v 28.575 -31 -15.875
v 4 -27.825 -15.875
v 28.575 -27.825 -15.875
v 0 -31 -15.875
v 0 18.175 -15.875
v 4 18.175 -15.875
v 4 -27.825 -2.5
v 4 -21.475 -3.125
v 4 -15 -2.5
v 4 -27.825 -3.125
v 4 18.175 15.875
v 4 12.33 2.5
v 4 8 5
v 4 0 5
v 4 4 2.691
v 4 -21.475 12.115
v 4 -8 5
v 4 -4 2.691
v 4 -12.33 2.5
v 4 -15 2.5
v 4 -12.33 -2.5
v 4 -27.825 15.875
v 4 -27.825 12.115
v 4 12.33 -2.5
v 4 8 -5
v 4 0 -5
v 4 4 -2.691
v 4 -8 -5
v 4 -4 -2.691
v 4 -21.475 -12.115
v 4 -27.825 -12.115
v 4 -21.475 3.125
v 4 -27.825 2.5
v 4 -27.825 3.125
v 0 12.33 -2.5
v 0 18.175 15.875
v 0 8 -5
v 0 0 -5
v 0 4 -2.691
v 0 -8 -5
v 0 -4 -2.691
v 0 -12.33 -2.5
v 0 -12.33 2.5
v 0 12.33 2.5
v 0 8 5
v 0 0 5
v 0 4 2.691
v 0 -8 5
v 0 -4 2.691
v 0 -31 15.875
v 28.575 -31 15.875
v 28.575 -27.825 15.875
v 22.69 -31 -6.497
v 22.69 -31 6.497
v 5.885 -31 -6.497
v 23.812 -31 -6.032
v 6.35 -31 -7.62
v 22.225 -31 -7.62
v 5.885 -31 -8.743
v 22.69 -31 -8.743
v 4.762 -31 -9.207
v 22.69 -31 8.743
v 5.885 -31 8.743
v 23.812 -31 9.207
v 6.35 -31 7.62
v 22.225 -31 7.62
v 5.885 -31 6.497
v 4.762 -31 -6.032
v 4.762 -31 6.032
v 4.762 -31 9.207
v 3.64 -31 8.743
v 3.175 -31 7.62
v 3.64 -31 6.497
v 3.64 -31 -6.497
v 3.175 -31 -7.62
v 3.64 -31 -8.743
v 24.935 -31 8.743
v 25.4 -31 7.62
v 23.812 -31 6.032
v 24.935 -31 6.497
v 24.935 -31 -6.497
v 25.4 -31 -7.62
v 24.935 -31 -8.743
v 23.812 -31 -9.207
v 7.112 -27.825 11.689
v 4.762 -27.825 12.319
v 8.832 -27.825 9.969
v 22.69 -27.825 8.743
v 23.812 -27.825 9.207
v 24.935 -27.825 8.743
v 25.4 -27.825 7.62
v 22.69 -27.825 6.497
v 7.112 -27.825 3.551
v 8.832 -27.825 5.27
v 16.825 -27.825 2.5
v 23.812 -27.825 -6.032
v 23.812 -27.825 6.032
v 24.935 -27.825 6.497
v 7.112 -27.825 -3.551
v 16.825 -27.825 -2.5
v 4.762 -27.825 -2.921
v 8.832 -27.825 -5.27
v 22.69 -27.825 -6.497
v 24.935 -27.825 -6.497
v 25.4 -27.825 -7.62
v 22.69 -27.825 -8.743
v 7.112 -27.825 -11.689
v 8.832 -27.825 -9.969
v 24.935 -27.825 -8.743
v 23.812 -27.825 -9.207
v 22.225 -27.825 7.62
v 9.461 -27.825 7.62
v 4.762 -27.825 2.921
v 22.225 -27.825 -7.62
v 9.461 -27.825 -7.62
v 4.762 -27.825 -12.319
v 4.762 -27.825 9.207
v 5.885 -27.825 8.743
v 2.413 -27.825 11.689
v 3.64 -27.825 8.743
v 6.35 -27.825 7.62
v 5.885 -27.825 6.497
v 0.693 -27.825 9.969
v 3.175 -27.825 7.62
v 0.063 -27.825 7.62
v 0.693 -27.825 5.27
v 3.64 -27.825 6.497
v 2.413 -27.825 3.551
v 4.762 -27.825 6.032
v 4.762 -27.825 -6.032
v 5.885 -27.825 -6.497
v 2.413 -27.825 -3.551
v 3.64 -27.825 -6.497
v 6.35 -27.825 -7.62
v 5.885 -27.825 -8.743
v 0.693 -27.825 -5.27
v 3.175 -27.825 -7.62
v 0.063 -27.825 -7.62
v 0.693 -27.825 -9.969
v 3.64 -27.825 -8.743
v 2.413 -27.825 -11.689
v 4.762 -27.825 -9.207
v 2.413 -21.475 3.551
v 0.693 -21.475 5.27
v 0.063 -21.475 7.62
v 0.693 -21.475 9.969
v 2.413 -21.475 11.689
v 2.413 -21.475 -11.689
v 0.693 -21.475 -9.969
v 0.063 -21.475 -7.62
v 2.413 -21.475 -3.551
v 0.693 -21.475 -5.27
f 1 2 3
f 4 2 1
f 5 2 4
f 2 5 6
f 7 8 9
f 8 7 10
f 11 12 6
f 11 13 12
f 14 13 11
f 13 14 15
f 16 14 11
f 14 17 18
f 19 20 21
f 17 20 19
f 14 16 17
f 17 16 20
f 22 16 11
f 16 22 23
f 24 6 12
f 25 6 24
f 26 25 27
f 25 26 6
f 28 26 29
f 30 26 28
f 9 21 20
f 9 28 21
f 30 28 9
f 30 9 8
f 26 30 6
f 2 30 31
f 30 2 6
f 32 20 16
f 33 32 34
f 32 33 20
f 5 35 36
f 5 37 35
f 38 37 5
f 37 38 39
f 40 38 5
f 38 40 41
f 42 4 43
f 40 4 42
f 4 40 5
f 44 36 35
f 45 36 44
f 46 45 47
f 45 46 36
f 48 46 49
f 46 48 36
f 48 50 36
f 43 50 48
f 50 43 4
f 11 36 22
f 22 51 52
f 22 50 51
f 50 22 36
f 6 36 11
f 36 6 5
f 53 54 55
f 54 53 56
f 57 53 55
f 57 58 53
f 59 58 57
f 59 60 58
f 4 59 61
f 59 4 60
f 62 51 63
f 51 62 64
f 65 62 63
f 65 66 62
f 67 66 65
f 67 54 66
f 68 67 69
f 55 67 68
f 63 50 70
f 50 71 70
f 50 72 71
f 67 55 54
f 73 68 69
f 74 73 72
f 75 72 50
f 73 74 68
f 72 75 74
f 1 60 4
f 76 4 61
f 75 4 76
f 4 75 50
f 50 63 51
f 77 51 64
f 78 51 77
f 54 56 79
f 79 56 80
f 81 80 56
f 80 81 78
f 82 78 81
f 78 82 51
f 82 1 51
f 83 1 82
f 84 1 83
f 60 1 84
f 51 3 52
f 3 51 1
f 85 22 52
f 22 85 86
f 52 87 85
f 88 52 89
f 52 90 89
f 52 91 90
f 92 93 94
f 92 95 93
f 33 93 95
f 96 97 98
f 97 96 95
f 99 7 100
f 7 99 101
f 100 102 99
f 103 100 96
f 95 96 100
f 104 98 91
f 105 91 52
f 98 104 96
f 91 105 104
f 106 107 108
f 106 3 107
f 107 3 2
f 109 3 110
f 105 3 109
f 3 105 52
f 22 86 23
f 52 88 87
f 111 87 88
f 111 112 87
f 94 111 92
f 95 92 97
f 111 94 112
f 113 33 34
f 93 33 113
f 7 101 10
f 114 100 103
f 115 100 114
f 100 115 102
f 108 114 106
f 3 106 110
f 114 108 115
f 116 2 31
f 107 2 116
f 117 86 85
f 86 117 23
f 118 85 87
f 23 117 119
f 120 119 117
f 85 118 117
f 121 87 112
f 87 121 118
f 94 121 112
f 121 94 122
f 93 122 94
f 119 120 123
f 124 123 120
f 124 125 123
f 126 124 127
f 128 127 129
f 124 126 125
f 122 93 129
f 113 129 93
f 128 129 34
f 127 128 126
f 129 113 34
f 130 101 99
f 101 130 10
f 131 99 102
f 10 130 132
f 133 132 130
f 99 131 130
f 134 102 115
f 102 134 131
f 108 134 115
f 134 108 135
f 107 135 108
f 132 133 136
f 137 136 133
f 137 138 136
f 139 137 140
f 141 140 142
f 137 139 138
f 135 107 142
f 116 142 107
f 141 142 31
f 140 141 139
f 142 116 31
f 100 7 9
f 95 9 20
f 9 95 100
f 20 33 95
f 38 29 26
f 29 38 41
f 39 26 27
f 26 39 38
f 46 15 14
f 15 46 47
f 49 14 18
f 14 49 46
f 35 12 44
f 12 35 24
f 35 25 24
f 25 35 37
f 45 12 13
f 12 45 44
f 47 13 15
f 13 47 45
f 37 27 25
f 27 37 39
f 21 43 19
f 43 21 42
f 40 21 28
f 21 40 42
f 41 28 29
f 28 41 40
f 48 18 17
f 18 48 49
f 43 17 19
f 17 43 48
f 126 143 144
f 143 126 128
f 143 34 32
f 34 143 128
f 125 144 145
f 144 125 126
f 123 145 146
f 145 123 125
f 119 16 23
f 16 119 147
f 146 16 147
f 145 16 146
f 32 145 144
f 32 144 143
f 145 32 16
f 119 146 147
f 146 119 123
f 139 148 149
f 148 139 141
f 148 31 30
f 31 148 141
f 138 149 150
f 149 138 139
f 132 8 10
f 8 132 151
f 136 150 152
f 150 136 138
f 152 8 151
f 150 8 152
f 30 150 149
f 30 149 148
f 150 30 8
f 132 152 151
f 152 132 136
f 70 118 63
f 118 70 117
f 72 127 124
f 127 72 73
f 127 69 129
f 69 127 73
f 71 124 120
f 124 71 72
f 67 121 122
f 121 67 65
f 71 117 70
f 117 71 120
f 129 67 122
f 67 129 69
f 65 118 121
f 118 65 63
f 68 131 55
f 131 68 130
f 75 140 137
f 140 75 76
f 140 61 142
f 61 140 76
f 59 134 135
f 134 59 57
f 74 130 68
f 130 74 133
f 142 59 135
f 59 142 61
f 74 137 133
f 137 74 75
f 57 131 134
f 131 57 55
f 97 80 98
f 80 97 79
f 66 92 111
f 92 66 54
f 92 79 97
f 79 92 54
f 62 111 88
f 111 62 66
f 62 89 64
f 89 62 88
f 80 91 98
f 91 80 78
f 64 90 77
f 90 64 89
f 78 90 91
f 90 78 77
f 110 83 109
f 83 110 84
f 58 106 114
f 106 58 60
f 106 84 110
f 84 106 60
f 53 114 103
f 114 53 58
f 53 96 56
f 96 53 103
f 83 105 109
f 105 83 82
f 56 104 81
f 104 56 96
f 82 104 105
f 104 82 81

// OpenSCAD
// file: utils.scad
//
// general utility functions for OpenSCAD
//
function inch(in) = 25.4*in;
// main file
// ring mount for components
// Copyright (C) 2016, Theodore C Yapo

use <utils.scad>;


ring_length = 10;
//center_height = 14.5;
center_height = 31;
outer_d = 2*center_height / cos(30);
ring_thickness = 4;
inner_d = outer_d - 2*ring_thickness;
screw_spacing = inch(0.6);
base_width = inch(1.25);
base_thickness = inch(0.125);
base_length = inch(1.125);

nut_block_thickness = 6;
nut_block_width = 12;

// recesses for #4-40 hex nuts
nut_d = inch(0.25) / cos(30) + 0.5;
nut_h = 3;

set_screw_d = inch(0.125);

epsilon = 1;



face_thickness = 4;
face_height = center_height + base_thickness + 15;


module LED_mount(){
  difference(){
    union(){
      // face
      translate([-base_width/2, -center_height, 0]){
        cube([base_width, face_height, face_thickness]);
      }

      // base
      translate([-base_width/2, -center_height, 0]){
        cube([base_width, base_thickness, base_length]);
      }

      // brace
      brace_len = 20;
      brace_thickness = 5;
      translate([brace_thickness/2,
                 -center_height+brace_len,
                  0])
      rotate([0, -90, 0])
      linear_extrude(height = brace_thickness){
        polygon([[0, 0], [0, -brace_len], [brace_len, -brace_len]]);
      }
    }

    // star board holes
    translate([0, 0, -epsilon]){
      cylinder($fn=6, d = 10, h = face_thickness+2*epsilon);
    }
    translate([0, +8, -epsilon]){
      cylinder($fn=6, d = 10, h = face_thickness+2*epsilon);
    }
    translate([0, -8, -epsilon]){
      cylinder($fn=6, d = 10, h = face_thickness+2*epsilon);
    }

    // mounting screw clearance slots
    translate([-inch(0.6)/2,
               -center_height + base_thickness,
               (base_length - inch(0.75))/2]){
      rotate([-90, 0, 0]){
        cylinder($fn=12, d = inch(0.37), h = inch(0.25));
      }
    }
    translate([+inch(0.6)/2,
               -center_height + base_thickness,
               (base_length - inch(0.75))/2]){
      rotate([-90, 0, 0]){
        cylinder($fn=12, d = inch(0.37), h = inch(0.25));
      }
    }
    
    
    // mounting screw holes
    translate([-inch(0.6)/2,
               -center_height-epsilon,
               (base_length - inch(0.75))/2]){
      rotate([-90, 0, 0]){
        cylinder($fn=8, d = inch(0.125), h = inch(0.25));
      }
    }
    translate([+inch(0.6)/2,
               -center_height-epsilon,
               (base_length - inch(0.75))/2]){
      rotate([-90, 0, 0]){
        cylinder($fn=8, d = inch(0.125), h = inch(0.25));
      }
    }
    translate([-inch(0.6)/2,
               -center_height - epsilon,
               base_length - (base_length - inch(0.75))/2]){
      rotate([-90, 0, 0]){
        cylinder($fn=8, d = inch(0.125), h = inch(0.25));
      }
    }
    translate([+inch(0.6)/2,
               -center_height - epsilon,
               base_length - (base_length - inch(0.75))/2]){
      rotate([-90, 0, 0]){
        cylinder($fn=8, d = inch(0.125), h = inch(0.25));
      }
    }
  }  
}


module printing_layout()
{
  rotate([0, 90, 0]){
    LED_mount();
  }
}

module LED_mount_assembly()
{
  LED_mount();
  translate([0, 0, -10]){
    rotate([0, 0, 90]){
      color("purple") board();
    }
    translate([0, 0, -6]){
      led();
    }
  }

}


printing_layout();

//LED_mount_assembly();
